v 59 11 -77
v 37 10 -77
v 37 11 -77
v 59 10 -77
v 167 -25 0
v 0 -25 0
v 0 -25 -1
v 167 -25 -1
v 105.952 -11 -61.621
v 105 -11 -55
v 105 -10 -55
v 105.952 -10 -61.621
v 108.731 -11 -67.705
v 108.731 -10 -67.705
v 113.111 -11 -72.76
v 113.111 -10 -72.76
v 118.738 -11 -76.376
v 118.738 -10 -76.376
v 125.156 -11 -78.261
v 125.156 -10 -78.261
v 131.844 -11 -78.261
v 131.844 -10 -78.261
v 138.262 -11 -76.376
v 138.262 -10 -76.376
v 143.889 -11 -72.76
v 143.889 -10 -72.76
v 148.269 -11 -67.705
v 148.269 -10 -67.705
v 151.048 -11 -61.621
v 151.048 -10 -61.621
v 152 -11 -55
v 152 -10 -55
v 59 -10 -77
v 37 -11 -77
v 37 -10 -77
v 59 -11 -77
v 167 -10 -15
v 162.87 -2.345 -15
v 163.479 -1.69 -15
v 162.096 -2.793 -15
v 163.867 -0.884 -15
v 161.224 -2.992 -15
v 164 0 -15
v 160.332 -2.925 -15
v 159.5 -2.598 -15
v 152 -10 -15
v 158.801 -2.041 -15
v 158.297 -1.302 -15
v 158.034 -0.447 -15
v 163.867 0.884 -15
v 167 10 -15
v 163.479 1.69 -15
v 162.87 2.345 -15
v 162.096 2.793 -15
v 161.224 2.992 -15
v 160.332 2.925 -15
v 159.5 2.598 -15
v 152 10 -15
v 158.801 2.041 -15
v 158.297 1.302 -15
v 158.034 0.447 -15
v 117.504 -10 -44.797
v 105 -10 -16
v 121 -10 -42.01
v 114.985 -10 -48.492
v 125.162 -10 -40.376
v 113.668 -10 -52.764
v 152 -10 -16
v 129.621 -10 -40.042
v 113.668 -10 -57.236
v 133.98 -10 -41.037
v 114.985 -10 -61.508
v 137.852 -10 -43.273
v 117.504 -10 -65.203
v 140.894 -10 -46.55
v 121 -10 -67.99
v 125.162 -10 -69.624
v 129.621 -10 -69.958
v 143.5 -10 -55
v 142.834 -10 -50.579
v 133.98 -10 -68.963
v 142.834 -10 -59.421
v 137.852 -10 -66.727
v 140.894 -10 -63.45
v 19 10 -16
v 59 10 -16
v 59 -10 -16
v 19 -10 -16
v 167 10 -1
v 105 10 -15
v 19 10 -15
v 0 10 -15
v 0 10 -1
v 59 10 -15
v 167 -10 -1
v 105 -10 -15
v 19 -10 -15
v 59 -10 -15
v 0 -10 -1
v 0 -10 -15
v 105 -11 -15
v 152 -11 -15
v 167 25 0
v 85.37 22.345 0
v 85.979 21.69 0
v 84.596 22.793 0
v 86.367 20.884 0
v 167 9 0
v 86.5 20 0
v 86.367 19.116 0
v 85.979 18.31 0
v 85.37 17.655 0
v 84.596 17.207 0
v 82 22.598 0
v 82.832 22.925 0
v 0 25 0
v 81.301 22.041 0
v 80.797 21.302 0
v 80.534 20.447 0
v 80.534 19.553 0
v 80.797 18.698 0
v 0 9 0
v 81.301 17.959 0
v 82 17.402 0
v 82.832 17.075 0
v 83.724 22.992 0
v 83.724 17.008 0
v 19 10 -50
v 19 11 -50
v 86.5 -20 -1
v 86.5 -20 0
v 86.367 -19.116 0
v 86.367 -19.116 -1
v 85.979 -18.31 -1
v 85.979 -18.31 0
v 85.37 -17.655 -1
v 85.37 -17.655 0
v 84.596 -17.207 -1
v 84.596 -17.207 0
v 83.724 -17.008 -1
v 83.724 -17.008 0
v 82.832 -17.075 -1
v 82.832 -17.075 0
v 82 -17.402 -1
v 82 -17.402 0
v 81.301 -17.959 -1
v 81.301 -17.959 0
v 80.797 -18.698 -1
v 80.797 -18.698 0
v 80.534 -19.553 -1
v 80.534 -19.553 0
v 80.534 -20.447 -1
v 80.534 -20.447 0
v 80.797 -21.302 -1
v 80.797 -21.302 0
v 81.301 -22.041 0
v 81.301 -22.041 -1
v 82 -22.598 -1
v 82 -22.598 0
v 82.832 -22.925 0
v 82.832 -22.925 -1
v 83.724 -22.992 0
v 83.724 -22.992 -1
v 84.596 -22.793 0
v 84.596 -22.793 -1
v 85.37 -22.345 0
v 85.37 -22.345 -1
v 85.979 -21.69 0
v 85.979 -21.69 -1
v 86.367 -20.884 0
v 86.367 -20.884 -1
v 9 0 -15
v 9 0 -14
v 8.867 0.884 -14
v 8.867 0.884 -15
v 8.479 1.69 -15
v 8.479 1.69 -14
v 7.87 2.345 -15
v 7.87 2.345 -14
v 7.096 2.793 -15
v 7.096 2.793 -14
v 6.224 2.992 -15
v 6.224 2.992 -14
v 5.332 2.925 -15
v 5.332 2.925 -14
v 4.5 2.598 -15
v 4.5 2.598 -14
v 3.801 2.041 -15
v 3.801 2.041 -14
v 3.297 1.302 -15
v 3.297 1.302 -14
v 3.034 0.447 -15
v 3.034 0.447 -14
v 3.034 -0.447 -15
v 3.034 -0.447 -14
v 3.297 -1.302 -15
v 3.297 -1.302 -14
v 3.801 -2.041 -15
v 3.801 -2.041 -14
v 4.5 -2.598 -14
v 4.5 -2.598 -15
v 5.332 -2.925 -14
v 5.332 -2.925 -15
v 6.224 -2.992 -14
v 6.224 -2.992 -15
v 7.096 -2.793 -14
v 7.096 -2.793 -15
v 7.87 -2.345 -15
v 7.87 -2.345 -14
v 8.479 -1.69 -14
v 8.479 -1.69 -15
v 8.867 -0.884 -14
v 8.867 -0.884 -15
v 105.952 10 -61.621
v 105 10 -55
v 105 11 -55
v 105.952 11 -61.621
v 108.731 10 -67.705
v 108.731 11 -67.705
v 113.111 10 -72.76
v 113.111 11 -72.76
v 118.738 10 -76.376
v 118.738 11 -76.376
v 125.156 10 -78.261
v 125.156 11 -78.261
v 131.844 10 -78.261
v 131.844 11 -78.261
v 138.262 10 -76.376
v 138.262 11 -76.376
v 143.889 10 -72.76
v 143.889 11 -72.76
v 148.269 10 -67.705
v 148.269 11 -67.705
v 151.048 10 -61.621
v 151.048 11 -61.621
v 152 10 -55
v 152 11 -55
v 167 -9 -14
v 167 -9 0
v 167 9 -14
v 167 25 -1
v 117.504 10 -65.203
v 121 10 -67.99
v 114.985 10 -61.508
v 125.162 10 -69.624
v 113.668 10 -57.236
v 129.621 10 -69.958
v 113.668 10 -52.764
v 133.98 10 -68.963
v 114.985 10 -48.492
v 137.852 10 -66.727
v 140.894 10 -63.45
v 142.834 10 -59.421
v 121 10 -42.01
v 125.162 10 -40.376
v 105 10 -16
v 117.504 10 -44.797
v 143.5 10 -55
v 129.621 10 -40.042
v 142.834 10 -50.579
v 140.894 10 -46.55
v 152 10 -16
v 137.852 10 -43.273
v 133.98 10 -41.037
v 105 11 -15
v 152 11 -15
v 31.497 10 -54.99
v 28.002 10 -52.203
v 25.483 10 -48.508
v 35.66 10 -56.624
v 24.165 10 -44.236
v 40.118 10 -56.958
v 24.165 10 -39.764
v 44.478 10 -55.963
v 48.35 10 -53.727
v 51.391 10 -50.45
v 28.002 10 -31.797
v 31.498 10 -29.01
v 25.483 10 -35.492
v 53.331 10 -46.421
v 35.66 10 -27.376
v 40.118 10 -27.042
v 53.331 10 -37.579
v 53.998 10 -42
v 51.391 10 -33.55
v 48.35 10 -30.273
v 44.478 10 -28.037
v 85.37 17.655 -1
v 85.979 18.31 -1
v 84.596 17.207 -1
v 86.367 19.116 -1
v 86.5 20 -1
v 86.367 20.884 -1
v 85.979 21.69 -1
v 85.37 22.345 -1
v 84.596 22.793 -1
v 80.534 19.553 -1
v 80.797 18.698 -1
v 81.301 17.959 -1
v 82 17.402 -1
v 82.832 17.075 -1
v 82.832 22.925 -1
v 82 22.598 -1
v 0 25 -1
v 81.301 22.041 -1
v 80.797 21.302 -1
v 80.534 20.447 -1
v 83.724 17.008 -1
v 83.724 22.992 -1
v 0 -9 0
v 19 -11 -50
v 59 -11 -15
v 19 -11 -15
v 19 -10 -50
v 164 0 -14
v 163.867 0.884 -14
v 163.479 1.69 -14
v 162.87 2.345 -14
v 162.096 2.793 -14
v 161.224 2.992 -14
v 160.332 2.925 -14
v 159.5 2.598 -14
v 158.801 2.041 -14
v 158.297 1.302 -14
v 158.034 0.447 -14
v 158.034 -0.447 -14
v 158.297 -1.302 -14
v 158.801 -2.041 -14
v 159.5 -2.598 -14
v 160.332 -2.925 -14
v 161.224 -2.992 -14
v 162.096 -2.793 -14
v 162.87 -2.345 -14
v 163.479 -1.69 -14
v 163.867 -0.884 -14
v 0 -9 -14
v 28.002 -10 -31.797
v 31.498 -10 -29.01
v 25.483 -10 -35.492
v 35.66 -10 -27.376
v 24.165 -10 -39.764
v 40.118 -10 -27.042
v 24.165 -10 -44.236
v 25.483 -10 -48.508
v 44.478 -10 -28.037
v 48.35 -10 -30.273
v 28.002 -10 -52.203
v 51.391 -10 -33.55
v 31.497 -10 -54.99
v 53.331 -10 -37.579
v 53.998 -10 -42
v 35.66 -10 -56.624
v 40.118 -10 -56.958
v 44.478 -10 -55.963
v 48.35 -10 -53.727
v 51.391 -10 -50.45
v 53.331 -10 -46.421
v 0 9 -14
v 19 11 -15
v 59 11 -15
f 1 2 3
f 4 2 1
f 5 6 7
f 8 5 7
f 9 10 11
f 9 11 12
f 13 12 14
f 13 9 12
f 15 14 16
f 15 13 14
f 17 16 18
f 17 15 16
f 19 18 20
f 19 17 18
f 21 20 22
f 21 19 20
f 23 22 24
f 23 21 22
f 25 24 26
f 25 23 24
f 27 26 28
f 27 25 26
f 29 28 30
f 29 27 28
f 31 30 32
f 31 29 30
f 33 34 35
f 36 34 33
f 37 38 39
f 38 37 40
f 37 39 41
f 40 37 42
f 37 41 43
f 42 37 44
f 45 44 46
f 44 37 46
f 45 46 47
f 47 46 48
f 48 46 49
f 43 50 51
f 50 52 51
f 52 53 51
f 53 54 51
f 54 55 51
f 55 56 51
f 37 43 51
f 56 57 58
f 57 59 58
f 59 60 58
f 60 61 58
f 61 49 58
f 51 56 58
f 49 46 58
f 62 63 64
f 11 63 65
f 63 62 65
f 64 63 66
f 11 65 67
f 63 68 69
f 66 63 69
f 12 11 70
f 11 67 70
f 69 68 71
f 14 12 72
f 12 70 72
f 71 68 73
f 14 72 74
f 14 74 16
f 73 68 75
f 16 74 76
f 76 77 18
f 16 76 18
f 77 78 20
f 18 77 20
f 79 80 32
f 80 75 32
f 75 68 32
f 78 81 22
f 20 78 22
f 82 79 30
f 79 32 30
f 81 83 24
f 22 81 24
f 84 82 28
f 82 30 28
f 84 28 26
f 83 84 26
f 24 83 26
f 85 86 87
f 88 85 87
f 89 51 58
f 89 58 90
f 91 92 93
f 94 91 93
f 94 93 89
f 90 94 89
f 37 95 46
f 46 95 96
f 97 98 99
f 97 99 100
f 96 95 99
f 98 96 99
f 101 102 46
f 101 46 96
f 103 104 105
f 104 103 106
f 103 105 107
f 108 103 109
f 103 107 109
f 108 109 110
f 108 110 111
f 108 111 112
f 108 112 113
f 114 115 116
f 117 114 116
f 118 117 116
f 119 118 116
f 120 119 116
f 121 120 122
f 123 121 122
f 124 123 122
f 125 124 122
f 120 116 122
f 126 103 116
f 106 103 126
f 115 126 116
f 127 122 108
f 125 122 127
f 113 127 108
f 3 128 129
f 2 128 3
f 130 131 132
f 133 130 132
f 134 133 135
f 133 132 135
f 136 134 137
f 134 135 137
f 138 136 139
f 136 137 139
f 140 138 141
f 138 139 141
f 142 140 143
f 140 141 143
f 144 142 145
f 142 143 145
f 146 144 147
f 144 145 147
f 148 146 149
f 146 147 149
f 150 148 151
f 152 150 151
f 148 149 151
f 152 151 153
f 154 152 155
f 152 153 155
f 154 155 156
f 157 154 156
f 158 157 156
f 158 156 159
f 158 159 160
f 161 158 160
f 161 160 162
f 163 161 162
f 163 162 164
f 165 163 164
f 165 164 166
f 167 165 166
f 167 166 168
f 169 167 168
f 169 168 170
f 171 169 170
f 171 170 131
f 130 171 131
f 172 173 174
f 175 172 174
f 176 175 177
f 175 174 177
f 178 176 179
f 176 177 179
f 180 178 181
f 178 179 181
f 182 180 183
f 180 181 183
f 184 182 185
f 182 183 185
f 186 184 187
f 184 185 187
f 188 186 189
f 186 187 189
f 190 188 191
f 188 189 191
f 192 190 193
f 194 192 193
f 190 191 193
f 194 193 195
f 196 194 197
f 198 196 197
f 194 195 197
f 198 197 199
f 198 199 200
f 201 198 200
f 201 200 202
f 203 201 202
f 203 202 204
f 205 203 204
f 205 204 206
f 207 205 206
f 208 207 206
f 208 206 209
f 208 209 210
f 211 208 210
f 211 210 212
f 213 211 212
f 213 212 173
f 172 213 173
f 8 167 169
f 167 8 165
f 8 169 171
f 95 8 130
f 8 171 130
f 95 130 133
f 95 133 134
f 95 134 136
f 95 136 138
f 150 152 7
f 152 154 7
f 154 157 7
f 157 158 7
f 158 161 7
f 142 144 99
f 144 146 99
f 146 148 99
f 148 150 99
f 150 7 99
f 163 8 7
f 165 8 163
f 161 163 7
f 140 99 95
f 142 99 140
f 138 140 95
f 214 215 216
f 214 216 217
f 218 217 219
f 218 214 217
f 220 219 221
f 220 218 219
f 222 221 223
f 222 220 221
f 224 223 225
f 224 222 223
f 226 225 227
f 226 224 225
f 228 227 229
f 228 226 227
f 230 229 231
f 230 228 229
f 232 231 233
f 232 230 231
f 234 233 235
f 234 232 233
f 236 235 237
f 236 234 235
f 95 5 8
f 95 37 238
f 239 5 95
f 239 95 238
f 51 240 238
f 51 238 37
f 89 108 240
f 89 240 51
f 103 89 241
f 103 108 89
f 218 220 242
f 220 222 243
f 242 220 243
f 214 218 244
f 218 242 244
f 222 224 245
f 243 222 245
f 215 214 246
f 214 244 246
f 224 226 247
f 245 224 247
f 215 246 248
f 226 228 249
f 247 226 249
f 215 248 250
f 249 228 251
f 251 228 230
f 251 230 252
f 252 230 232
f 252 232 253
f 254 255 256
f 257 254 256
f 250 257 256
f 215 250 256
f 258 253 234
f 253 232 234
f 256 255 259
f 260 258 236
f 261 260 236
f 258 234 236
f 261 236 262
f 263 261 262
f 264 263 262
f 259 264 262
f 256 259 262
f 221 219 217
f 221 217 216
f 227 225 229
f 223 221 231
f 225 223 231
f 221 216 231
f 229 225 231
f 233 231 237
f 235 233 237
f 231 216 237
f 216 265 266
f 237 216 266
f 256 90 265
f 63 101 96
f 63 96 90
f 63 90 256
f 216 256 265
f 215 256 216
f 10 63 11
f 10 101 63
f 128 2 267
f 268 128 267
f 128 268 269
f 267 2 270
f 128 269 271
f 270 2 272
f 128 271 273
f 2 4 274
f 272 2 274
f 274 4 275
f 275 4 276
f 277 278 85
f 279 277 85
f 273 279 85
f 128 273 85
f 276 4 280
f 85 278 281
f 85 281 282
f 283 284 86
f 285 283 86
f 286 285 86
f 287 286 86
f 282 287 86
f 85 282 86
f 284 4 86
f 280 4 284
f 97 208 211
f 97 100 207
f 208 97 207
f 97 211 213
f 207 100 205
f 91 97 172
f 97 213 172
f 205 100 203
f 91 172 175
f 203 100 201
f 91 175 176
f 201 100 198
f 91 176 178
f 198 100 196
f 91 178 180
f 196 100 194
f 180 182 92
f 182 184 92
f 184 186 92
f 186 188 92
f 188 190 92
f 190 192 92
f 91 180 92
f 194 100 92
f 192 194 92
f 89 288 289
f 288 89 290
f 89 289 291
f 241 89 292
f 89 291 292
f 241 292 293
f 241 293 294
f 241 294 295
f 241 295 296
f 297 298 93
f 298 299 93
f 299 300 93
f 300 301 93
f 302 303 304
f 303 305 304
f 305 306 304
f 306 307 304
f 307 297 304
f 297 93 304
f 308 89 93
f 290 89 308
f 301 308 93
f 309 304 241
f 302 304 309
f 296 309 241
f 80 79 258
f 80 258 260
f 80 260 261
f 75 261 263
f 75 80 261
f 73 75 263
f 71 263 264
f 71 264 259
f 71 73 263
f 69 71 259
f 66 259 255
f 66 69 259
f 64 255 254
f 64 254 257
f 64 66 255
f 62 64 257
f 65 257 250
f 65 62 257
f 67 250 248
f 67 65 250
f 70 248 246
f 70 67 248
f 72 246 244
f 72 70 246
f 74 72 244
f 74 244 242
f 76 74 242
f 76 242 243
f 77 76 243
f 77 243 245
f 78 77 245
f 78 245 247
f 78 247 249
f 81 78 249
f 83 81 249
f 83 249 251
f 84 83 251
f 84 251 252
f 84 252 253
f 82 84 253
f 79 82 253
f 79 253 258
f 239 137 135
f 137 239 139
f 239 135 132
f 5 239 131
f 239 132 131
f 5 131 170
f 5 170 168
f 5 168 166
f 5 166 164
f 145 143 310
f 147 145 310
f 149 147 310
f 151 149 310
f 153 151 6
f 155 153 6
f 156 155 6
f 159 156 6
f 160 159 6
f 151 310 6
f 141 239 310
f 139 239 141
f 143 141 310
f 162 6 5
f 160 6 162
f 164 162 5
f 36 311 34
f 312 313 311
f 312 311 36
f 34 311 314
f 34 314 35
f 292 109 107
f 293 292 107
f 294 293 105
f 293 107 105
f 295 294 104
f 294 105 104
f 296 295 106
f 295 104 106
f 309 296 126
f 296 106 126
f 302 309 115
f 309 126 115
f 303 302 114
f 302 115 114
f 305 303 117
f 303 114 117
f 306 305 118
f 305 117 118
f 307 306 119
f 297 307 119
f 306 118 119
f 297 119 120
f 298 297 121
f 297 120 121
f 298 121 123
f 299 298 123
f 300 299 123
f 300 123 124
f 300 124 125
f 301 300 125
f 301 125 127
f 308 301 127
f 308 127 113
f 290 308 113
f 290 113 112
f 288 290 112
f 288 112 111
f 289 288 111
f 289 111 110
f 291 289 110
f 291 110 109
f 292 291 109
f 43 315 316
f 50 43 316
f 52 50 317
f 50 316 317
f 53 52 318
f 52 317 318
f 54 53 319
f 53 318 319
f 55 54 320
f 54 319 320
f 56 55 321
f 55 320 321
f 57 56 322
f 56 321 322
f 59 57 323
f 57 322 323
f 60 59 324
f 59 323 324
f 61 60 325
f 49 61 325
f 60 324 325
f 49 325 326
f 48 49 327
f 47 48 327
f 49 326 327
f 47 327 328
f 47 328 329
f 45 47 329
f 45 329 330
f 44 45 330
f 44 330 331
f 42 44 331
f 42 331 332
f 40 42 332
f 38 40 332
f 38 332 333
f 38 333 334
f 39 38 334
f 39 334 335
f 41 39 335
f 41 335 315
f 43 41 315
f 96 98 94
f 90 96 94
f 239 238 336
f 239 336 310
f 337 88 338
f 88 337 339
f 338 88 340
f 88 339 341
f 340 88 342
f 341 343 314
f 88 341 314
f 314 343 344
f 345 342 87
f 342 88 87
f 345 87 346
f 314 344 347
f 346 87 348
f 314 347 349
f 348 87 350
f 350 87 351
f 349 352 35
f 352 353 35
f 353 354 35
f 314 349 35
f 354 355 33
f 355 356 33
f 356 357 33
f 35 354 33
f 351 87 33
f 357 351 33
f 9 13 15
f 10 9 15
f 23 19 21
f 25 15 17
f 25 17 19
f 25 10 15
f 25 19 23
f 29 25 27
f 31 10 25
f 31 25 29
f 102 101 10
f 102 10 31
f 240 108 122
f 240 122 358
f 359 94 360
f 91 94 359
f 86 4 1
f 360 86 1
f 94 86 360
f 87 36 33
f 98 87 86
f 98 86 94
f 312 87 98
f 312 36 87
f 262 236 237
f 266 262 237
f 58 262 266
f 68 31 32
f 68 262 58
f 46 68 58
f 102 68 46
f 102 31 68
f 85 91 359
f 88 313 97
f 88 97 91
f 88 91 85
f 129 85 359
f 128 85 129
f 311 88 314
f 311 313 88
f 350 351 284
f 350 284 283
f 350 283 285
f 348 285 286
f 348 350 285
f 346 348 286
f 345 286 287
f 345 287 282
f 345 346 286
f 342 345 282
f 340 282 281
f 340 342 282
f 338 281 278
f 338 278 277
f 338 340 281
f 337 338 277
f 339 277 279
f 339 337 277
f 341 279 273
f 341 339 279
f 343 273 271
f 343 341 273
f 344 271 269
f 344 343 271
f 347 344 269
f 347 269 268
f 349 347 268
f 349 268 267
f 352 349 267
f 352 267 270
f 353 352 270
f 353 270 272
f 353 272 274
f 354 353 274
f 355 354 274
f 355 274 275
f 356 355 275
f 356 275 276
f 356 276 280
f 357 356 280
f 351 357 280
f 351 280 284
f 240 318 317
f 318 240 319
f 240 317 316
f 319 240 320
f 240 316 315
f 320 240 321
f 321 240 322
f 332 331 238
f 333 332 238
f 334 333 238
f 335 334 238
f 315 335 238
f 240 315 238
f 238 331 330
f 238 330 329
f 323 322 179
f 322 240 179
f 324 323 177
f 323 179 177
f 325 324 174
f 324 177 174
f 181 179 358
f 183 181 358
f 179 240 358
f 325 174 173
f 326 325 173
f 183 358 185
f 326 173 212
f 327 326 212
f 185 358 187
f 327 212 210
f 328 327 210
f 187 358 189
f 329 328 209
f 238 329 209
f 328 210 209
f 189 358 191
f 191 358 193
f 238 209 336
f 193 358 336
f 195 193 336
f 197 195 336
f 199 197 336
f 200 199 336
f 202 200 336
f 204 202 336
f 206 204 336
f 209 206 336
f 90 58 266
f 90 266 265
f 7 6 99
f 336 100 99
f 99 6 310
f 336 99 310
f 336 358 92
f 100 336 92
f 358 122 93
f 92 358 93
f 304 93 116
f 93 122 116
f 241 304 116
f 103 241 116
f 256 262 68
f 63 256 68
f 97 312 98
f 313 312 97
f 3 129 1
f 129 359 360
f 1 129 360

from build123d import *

# Parameters (mm, degrees)
F1_DEPTH  = 167
F3_DEPTH  = 11
F5_DEPTH  = 11
F7_DEPTH  = 152.001
F8_R      = 3
F9_DEPTH  = 78.501
F10_R     = 3
F11_DEPTH = 64.501
F12_R     = 15
F13_DEPTH = 21
F14_R     = 15
F15_DEPTH = 21


with BuildPart() as f1:
    # F0 (on Right) → F1 (new body)
    with BuildSketch(Plane.YZ):
        Polygon((-9, 0), (-25, 0), (-25, -1), (-10, -1), (-10, -15), (0, -15), (10, -15), (10, -1), (25, -1), (25, 0), (9, 0), (9, -14), (0, -14), (-9, -14), align=None)
    extrude(amount=F1_DEPTH)

    # F2 (on Front) → F3 (join, symmetric)
    with BuildSketch(Plane.XZ):
        with BuildLine():
            Line((152, -55), (152, -15))
            Line((152, -15), (105, -15))
            Line((105, -15), (105, -55))
            ThreePointArc((105, -55), (128.5, -78.5), (152, -55))
        make_face()
    extrude(amount=F3_DEPTH, both=True)

    # F4 (on Front) → F5 (join, symmetric)
    with BuildSketch(Plane.XZ):
        Polygon((59, -15), (19, -15), (19, -50), (37, -77), (59, -77), align=None)
    extrude(amount=F5_DEPTH, both=True)

    # F6 (on face) → F7 (cut, through all)
    with BuildSketch(Plane.YZ.offset(152)):
        Polygon((0, -16), (-10, -16), (-10, -83.886804), (0, -83.886804), (10, -83.886804), (10, -16), align=None)
    extrude(amount=-F7_DEPTH, mode=Mode.SUBTRACT)

    # F8 (on face) → F9 (cut, through all)
    with BuildSketch(Plane.XY):
        with Locations((83.5, 20)):
            Circle(F8_R)
        with Locations((83.5, -20)):
            Circle(F8_R)
    extrude(amount=-F9_DEPTH, mode=Mode.SUBTRACT)

    # F10 (on face) → F11 (cut, through all)
    with BuildSketch(Plane.XY.offset(-14)):
        with Locations((161, 0)):
            Circle(F10_R)
        with Locations((6, 0)):
            Circle(F10_R)
    extrude(amount=-F11_DEPTH, mode=Mode.SUBTRACT)

    # F12 (on face) → F13 (join, through all)
    with BuildSketch(Plane.XZ.offset(11)):
        with Locations((128.5, -55)):
            Circle(F12_R)
    extrude(amount=-F13_DEPTH)

    # F14 (on face) → F15 (join, through all)
    with BuildSketch(Plane.XZ.offset(11)):
        with Locations((38.9975, -42)):
            Circle(F14_R)
    extrude(amount=-F15_DEPTH)


solid = f1.part
